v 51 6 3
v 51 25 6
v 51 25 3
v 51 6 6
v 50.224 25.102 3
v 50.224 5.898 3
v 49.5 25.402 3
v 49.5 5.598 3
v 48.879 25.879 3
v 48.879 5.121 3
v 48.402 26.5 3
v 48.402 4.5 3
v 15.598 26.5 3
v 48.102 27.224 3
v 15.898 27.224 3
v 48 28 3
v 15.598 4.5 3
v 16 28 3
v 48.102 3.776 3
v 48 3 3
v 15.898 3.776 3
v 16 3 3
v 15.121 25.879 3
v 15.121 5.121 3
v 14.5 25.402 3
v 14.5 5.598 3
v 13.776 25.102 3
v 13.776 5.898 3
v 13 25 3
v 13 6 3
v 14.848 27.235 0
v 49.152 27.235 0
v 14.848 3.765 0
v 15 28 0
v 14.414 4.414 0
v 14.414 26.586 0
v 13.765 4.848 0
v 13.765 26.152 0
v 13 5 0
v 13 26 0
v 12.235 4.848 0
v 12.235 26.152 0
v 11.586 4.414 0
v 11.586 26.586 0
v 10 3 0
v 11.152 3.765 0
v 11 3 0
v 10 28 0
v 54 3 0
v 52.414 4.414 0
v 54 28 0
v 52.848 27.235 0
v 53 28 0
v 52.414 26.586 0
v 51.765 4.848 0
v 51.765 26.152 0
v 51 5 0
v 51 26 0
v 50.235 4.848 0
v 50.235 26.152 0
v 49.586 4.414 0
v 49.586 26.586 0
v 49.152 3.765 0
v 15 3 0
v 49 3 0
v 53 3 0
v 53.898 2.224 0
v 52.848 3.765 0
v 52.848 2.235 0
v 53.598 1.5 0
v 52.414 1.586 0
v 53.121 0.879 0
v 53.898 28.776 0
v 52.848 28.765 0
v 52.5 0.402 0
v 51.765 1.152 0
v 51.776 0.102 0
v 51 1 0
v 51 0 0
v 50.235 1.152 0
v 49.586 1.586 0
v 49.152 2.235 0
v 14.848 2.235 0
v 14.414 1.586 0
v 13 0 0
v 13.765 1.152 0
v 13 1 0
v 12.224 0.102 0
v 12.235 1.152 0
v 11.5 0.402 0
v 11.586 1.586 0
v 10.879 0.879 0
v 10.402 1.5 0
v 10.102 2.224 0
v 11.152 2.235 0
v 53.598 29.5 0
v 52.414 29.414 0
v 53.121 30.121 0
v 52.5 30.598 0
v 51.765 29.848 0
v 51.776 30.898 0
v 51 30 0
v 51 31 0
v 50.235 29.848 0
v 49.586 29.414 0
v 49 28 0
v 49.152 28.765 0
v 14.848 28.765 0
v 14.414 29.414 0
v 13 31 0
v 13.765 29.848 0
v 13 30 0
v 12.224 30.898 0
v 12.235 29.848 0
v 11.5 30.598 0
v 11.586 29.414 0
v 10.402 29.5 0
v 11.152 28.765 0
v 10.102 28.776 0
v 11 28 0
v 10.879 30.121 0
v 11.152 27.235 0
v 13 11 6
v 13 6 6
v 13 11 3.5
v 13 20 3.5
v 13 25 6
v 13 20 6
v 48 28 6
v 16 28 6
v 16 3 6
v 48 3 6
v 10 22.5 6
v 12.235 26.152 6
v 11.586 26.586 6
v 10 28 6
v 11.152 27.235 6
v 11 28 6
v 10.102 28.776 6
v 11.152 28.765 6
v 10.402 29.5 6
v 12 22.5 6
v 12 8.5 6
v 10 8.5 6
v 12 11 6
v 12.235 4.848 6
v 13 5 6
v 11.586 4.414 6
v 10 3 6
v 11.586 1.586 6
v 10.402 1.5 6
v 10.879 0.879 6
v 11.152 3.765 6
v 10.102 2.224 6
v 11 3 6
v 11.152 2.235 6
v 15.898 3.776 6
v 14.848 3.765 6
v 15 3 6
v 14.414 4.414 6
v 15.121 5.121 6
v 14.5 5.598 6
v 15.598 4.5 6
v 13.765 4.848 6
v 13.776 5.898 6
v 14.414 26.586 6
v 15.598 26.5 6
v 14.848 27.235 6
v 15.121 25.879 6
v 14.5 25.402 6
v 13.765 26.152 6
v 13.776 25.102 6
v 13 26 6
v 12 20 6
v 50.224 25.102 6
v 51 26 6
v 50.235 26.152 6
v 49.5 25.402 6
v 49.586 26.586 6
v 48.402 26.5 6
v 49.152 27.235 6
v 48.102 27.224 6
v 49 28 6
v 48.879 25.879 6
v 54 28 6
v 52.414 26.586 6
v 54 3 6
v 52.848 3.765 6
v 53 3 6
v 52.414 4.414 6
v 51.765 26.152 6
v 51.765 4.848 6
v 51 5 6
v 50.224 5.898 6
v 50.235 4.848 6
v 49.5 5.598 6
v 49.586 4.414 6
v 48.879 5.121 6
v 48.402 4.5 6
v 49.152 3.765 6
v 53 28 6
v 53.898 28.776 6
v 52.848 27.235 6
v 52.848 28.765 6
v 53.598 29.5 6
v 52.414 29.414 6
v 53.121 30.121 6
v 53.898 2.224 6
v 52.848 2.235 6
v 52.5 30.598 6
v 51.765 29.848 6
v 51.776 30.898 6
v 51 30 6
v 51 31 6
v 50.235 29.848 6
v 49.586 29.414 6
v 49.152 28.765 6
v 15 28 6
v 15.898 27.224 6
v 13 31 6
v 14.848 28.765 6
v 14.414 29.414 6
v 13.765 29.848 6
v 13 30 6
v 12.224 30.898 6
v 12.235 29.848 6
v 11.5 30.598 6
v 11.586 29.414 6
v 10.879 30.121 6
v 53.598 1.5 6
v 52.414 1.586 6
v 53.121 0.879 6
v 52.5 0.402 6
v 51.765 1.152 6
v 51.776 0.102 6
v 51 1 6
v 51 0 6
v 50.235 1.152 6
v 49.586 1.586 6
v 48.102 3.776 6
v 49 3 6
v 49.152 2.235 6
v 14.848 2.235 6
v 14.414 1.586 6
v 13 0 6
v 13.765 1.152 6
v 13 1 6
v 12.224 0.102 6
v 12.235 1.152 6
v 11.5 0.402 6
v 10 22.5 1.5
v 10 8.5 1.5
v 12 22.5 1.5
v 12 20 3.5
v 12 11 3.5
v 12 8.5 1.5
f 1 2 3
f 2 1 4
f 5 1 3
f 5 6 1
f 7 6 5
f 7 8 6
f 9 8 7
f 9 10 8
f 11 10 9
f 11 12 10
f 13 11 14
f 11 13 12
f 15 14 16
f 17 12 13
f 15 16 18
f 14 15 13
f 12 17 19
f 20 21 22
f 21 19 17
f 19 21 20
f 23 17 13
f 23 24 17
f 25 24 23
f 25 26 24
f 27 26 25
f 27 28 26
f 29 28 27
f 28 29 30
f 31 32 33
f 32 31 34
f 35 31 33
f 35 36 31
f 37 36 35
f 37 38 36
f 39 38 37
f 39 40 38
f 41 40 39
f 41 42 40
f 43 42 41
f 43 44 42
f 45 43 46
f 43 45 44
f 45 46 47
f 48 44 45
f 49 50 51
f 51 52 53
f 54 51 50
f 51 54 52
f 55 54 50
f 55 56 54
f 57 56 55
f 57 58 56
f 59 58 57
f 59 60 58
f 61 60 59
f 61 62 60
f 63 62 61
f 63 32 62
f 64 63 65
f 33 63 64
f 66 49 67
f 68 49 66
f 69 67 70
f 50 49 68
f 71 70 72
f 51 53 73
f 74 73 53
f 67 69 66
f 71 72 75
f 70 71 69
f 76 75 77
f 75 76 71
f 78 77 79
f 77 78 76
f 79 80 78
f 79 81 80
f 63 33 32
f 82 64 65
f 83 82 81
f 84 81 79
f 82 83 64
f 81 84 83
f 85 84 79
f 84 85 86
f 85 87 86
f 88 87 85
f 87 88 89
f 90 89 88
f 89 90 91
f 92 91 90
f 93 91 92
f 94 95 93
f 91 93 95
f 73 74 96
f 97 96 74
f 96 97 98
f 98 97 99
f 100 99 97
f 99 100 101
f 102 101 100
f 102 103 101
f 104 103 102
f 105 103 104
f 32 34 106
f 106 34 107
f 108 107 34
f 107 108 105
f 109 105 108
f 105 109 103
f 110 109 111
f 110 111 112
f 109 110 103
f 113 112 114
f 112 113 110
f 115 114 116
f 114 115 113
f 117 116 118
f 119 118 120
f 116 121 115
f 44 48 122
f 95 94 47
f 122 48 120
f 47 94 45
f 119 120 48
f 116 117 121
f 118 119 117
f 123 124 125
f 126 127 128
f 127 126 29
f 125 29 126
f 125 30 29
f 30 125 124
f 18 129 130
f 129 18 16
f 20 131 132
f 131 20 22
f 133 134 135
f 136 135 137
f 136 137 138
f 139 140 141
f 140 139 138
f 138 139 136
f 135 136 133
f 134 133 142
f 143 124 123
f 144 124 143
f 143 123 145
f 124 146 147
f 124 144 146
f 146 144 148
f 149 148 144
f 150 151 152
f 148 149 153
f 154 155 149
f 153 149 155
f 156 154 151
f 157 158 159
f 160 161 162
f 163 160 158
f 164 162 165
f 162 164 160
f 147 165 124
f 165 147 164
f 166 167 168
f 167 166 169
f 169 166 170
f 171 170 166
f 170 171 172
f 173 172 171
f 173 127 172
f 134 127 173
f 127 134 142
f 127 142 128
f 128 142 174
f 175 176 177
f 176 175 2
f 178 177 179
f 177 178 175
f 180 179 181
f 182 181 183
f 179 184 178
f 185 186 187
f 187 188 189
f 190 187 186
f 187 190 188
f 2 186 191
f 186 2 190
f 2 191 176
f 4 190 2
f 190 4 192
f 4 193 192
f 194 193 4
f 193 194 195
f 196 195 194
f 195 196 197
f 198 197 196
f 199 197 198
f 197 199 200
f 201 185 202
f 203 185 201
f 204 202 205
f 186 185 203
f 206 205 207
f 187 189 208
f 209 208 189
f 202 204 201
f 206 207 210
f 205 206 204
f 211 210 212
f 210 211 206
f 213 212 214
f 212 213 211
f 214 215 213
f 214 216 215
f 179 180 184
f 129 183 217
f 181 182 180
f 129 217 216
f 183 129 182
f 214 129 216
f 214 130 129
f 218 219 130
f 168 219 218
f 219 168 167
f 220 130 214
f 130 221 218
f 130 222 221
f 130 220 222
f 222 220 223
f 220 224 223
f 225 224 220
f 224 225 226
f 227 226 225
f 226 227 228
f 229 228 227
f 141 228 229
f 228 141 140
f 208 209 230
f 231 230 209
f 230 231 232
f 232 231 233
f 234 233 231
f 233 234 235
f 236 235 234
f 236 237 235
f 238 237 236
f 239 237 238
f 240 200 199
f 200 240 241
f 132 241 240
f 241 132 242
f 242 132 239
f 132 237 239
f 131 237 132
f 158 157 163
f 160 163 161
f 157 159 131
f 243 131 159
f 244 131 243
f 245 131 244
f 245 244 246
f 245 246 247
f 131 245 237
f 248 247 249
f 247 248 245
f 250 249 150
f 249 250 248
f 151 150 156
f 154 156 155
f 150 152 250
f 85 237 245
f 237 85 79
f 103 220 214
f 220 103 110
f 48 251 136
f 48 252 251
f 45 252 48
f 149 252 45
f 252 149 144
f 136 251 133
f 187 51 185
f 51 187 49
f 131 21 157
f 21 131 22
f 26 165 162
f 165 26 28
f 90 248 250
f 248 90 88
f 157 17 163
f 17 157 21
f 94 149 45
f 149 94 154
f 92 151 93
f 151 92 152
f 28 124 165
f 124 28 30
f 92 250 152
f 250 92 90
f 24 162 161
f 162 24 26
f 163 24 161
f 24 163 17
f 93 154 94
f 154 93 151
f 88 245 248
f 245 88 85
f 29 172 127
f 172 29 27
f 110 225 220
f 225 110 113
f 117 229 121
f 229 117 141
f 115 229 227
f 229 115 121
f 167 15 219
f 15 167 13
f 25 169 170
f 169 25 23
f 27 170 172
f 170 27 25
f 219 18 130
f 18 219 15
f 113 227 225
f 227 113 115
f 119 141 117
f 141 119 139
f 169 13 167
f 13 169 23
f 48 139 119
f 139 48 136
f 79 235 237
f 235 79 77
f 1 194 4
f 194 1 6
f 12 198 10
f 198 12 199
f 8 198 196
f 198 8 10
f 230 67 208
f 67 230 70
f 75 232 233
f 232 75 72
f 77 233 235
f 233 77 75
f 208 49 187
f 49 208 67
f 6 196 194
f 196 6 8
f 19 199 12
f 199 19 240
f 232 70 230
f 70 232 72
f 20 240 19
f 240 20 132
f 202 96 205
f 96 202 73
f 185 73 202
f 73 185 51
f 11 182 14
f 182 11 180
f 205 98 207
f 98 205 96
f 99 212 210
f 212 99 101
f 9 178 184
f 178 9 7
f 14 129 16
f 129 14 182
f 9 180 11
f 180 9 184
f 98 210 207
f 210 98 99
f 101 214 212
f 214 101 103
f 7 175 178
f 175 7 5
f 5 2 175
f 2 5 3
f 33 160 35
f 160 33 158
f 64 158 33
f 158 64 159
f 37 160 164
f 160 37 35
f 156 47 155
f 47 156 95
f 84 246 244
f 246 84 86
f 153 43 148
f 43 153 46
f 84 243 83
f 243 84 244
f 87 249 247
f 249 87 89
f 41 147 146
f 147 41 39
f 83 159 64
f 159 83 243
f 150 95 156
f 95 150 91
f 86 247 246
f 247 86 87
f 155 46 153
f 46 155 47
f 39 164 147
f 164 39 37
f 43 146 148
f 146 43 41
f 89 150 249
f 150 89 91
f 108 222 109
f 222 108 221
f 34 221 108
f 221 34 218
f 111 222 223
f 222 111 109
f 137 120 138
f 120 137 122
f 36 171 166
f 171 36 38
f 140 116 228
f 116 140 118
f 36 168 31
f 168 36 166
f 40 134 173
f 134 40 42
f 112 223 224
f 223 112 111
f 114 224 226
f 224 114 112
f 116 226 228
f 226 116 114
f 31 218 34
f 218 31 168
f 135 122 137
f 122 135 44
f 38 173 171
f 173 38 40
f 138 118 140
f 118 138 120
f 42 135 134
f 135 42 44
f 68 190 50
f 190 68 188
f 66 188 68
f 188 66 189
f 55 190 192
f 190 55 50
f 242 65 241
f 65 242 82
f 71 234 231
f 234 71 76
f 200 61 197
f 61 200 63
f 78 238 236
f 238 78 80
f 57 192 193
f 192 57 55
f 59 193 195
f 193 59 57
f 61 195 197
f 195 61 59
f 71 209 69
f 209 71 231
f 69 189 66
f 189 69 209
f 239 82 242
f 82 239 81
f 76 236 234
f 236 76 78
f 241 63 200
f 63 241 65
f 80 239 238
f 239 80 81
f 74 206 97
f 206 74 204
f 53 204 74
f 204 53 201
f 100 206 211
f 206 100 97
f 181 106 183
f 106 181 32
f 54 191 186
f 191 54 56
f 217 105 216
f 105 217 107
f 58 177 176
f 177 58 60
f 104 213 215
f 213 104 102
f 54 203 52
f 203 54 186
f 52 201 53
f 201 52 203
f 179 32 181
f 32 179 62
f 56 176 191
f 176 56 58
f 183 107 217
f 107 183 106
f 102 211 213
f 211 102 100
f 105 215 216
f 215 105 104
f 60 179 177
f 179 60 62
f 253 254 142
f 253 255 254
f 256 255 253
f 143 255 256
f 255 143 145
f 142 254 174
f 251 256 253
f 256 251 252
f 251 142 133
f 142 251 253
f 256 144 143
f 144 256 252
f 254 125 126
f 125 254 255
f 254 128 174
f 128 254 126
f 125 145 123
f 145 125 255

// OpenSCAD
height = 6;
length = 60;
width = 31;

thickness = 3;
hole = [4,4];  
plugWidth = 14;
plugDepth = 4;

$fa = 6;
$fs = 0.8;

module fourHole(x, y, diam){
    xy = [1,-1];
for(a = [0:1],b=[0:1]){
translate([x/2*xy[a],y/2*xy[b],5])
    cylinder(11,d=diam,center = true);
}    
}

 difference(){
 union(){
/*difference(){
cube([length,width,thickness]);  // base
    translate([13,thickness,-1])
    cube([38,25,thickness]);      // cut out from base
}  */
     translate([13,thickness,0])
     cube([38,25,thickness]);
// walls
 translate([13,0,0])
 cube([38,3,height]);
 translate([13,28,0])
 cube([38,3,height]);
 translate([10,3,0])
 cube([3,25,height]);
 translate([51,3,0])
 cube([3,25,height]);

 translate([13,3,0])
 cylinder(height,3,3);
  
  translate([13,28,0])
 cylinder(height,3,3);
  translate([51,3,0])
 cylinder(height,3,3);
  translate([51,28,0])
 cylinder(height,3,3);
 }   // end of union
   // mounting holes in base
 /* translate([4,7,-1])
    cylinder(thickness+2,d = hole[0]);
   translate([4,24,-1])
    cylinder(thickness+2,d = hole[0]));
   translate([57,7,-1])
    cylinder(thickness+2,d = hole[0]));
   translate([57,24,-1])
    cylinder(thickness+2,d = hole[0]));
 */
  translate([13,3,height-8])
   cylinder(9,d=hole[0]);
   translate([13,28,height-8])
   cylinder(9,d=hole[0]);
   translate([51,3,height-8])
   cylinder(9,d=hole[0]);
   translate([51,28,height-8])
   cylinder(9,d=hole[0]);
 //  translate([9+thickness/2,18+thickness - plugWidth/2,height-plugDepth/2])
   translate([9+thickness/2,15.5,height-plugDepth/2])
   cube([3,plugWidth,plugDepth+1], center = true); 
   translate([9+thickness/2,15.5,height-plugDepth/2+2])
   cube([7,9,plugDepth+1], center = true);  // y was 7
   
   
 } 
